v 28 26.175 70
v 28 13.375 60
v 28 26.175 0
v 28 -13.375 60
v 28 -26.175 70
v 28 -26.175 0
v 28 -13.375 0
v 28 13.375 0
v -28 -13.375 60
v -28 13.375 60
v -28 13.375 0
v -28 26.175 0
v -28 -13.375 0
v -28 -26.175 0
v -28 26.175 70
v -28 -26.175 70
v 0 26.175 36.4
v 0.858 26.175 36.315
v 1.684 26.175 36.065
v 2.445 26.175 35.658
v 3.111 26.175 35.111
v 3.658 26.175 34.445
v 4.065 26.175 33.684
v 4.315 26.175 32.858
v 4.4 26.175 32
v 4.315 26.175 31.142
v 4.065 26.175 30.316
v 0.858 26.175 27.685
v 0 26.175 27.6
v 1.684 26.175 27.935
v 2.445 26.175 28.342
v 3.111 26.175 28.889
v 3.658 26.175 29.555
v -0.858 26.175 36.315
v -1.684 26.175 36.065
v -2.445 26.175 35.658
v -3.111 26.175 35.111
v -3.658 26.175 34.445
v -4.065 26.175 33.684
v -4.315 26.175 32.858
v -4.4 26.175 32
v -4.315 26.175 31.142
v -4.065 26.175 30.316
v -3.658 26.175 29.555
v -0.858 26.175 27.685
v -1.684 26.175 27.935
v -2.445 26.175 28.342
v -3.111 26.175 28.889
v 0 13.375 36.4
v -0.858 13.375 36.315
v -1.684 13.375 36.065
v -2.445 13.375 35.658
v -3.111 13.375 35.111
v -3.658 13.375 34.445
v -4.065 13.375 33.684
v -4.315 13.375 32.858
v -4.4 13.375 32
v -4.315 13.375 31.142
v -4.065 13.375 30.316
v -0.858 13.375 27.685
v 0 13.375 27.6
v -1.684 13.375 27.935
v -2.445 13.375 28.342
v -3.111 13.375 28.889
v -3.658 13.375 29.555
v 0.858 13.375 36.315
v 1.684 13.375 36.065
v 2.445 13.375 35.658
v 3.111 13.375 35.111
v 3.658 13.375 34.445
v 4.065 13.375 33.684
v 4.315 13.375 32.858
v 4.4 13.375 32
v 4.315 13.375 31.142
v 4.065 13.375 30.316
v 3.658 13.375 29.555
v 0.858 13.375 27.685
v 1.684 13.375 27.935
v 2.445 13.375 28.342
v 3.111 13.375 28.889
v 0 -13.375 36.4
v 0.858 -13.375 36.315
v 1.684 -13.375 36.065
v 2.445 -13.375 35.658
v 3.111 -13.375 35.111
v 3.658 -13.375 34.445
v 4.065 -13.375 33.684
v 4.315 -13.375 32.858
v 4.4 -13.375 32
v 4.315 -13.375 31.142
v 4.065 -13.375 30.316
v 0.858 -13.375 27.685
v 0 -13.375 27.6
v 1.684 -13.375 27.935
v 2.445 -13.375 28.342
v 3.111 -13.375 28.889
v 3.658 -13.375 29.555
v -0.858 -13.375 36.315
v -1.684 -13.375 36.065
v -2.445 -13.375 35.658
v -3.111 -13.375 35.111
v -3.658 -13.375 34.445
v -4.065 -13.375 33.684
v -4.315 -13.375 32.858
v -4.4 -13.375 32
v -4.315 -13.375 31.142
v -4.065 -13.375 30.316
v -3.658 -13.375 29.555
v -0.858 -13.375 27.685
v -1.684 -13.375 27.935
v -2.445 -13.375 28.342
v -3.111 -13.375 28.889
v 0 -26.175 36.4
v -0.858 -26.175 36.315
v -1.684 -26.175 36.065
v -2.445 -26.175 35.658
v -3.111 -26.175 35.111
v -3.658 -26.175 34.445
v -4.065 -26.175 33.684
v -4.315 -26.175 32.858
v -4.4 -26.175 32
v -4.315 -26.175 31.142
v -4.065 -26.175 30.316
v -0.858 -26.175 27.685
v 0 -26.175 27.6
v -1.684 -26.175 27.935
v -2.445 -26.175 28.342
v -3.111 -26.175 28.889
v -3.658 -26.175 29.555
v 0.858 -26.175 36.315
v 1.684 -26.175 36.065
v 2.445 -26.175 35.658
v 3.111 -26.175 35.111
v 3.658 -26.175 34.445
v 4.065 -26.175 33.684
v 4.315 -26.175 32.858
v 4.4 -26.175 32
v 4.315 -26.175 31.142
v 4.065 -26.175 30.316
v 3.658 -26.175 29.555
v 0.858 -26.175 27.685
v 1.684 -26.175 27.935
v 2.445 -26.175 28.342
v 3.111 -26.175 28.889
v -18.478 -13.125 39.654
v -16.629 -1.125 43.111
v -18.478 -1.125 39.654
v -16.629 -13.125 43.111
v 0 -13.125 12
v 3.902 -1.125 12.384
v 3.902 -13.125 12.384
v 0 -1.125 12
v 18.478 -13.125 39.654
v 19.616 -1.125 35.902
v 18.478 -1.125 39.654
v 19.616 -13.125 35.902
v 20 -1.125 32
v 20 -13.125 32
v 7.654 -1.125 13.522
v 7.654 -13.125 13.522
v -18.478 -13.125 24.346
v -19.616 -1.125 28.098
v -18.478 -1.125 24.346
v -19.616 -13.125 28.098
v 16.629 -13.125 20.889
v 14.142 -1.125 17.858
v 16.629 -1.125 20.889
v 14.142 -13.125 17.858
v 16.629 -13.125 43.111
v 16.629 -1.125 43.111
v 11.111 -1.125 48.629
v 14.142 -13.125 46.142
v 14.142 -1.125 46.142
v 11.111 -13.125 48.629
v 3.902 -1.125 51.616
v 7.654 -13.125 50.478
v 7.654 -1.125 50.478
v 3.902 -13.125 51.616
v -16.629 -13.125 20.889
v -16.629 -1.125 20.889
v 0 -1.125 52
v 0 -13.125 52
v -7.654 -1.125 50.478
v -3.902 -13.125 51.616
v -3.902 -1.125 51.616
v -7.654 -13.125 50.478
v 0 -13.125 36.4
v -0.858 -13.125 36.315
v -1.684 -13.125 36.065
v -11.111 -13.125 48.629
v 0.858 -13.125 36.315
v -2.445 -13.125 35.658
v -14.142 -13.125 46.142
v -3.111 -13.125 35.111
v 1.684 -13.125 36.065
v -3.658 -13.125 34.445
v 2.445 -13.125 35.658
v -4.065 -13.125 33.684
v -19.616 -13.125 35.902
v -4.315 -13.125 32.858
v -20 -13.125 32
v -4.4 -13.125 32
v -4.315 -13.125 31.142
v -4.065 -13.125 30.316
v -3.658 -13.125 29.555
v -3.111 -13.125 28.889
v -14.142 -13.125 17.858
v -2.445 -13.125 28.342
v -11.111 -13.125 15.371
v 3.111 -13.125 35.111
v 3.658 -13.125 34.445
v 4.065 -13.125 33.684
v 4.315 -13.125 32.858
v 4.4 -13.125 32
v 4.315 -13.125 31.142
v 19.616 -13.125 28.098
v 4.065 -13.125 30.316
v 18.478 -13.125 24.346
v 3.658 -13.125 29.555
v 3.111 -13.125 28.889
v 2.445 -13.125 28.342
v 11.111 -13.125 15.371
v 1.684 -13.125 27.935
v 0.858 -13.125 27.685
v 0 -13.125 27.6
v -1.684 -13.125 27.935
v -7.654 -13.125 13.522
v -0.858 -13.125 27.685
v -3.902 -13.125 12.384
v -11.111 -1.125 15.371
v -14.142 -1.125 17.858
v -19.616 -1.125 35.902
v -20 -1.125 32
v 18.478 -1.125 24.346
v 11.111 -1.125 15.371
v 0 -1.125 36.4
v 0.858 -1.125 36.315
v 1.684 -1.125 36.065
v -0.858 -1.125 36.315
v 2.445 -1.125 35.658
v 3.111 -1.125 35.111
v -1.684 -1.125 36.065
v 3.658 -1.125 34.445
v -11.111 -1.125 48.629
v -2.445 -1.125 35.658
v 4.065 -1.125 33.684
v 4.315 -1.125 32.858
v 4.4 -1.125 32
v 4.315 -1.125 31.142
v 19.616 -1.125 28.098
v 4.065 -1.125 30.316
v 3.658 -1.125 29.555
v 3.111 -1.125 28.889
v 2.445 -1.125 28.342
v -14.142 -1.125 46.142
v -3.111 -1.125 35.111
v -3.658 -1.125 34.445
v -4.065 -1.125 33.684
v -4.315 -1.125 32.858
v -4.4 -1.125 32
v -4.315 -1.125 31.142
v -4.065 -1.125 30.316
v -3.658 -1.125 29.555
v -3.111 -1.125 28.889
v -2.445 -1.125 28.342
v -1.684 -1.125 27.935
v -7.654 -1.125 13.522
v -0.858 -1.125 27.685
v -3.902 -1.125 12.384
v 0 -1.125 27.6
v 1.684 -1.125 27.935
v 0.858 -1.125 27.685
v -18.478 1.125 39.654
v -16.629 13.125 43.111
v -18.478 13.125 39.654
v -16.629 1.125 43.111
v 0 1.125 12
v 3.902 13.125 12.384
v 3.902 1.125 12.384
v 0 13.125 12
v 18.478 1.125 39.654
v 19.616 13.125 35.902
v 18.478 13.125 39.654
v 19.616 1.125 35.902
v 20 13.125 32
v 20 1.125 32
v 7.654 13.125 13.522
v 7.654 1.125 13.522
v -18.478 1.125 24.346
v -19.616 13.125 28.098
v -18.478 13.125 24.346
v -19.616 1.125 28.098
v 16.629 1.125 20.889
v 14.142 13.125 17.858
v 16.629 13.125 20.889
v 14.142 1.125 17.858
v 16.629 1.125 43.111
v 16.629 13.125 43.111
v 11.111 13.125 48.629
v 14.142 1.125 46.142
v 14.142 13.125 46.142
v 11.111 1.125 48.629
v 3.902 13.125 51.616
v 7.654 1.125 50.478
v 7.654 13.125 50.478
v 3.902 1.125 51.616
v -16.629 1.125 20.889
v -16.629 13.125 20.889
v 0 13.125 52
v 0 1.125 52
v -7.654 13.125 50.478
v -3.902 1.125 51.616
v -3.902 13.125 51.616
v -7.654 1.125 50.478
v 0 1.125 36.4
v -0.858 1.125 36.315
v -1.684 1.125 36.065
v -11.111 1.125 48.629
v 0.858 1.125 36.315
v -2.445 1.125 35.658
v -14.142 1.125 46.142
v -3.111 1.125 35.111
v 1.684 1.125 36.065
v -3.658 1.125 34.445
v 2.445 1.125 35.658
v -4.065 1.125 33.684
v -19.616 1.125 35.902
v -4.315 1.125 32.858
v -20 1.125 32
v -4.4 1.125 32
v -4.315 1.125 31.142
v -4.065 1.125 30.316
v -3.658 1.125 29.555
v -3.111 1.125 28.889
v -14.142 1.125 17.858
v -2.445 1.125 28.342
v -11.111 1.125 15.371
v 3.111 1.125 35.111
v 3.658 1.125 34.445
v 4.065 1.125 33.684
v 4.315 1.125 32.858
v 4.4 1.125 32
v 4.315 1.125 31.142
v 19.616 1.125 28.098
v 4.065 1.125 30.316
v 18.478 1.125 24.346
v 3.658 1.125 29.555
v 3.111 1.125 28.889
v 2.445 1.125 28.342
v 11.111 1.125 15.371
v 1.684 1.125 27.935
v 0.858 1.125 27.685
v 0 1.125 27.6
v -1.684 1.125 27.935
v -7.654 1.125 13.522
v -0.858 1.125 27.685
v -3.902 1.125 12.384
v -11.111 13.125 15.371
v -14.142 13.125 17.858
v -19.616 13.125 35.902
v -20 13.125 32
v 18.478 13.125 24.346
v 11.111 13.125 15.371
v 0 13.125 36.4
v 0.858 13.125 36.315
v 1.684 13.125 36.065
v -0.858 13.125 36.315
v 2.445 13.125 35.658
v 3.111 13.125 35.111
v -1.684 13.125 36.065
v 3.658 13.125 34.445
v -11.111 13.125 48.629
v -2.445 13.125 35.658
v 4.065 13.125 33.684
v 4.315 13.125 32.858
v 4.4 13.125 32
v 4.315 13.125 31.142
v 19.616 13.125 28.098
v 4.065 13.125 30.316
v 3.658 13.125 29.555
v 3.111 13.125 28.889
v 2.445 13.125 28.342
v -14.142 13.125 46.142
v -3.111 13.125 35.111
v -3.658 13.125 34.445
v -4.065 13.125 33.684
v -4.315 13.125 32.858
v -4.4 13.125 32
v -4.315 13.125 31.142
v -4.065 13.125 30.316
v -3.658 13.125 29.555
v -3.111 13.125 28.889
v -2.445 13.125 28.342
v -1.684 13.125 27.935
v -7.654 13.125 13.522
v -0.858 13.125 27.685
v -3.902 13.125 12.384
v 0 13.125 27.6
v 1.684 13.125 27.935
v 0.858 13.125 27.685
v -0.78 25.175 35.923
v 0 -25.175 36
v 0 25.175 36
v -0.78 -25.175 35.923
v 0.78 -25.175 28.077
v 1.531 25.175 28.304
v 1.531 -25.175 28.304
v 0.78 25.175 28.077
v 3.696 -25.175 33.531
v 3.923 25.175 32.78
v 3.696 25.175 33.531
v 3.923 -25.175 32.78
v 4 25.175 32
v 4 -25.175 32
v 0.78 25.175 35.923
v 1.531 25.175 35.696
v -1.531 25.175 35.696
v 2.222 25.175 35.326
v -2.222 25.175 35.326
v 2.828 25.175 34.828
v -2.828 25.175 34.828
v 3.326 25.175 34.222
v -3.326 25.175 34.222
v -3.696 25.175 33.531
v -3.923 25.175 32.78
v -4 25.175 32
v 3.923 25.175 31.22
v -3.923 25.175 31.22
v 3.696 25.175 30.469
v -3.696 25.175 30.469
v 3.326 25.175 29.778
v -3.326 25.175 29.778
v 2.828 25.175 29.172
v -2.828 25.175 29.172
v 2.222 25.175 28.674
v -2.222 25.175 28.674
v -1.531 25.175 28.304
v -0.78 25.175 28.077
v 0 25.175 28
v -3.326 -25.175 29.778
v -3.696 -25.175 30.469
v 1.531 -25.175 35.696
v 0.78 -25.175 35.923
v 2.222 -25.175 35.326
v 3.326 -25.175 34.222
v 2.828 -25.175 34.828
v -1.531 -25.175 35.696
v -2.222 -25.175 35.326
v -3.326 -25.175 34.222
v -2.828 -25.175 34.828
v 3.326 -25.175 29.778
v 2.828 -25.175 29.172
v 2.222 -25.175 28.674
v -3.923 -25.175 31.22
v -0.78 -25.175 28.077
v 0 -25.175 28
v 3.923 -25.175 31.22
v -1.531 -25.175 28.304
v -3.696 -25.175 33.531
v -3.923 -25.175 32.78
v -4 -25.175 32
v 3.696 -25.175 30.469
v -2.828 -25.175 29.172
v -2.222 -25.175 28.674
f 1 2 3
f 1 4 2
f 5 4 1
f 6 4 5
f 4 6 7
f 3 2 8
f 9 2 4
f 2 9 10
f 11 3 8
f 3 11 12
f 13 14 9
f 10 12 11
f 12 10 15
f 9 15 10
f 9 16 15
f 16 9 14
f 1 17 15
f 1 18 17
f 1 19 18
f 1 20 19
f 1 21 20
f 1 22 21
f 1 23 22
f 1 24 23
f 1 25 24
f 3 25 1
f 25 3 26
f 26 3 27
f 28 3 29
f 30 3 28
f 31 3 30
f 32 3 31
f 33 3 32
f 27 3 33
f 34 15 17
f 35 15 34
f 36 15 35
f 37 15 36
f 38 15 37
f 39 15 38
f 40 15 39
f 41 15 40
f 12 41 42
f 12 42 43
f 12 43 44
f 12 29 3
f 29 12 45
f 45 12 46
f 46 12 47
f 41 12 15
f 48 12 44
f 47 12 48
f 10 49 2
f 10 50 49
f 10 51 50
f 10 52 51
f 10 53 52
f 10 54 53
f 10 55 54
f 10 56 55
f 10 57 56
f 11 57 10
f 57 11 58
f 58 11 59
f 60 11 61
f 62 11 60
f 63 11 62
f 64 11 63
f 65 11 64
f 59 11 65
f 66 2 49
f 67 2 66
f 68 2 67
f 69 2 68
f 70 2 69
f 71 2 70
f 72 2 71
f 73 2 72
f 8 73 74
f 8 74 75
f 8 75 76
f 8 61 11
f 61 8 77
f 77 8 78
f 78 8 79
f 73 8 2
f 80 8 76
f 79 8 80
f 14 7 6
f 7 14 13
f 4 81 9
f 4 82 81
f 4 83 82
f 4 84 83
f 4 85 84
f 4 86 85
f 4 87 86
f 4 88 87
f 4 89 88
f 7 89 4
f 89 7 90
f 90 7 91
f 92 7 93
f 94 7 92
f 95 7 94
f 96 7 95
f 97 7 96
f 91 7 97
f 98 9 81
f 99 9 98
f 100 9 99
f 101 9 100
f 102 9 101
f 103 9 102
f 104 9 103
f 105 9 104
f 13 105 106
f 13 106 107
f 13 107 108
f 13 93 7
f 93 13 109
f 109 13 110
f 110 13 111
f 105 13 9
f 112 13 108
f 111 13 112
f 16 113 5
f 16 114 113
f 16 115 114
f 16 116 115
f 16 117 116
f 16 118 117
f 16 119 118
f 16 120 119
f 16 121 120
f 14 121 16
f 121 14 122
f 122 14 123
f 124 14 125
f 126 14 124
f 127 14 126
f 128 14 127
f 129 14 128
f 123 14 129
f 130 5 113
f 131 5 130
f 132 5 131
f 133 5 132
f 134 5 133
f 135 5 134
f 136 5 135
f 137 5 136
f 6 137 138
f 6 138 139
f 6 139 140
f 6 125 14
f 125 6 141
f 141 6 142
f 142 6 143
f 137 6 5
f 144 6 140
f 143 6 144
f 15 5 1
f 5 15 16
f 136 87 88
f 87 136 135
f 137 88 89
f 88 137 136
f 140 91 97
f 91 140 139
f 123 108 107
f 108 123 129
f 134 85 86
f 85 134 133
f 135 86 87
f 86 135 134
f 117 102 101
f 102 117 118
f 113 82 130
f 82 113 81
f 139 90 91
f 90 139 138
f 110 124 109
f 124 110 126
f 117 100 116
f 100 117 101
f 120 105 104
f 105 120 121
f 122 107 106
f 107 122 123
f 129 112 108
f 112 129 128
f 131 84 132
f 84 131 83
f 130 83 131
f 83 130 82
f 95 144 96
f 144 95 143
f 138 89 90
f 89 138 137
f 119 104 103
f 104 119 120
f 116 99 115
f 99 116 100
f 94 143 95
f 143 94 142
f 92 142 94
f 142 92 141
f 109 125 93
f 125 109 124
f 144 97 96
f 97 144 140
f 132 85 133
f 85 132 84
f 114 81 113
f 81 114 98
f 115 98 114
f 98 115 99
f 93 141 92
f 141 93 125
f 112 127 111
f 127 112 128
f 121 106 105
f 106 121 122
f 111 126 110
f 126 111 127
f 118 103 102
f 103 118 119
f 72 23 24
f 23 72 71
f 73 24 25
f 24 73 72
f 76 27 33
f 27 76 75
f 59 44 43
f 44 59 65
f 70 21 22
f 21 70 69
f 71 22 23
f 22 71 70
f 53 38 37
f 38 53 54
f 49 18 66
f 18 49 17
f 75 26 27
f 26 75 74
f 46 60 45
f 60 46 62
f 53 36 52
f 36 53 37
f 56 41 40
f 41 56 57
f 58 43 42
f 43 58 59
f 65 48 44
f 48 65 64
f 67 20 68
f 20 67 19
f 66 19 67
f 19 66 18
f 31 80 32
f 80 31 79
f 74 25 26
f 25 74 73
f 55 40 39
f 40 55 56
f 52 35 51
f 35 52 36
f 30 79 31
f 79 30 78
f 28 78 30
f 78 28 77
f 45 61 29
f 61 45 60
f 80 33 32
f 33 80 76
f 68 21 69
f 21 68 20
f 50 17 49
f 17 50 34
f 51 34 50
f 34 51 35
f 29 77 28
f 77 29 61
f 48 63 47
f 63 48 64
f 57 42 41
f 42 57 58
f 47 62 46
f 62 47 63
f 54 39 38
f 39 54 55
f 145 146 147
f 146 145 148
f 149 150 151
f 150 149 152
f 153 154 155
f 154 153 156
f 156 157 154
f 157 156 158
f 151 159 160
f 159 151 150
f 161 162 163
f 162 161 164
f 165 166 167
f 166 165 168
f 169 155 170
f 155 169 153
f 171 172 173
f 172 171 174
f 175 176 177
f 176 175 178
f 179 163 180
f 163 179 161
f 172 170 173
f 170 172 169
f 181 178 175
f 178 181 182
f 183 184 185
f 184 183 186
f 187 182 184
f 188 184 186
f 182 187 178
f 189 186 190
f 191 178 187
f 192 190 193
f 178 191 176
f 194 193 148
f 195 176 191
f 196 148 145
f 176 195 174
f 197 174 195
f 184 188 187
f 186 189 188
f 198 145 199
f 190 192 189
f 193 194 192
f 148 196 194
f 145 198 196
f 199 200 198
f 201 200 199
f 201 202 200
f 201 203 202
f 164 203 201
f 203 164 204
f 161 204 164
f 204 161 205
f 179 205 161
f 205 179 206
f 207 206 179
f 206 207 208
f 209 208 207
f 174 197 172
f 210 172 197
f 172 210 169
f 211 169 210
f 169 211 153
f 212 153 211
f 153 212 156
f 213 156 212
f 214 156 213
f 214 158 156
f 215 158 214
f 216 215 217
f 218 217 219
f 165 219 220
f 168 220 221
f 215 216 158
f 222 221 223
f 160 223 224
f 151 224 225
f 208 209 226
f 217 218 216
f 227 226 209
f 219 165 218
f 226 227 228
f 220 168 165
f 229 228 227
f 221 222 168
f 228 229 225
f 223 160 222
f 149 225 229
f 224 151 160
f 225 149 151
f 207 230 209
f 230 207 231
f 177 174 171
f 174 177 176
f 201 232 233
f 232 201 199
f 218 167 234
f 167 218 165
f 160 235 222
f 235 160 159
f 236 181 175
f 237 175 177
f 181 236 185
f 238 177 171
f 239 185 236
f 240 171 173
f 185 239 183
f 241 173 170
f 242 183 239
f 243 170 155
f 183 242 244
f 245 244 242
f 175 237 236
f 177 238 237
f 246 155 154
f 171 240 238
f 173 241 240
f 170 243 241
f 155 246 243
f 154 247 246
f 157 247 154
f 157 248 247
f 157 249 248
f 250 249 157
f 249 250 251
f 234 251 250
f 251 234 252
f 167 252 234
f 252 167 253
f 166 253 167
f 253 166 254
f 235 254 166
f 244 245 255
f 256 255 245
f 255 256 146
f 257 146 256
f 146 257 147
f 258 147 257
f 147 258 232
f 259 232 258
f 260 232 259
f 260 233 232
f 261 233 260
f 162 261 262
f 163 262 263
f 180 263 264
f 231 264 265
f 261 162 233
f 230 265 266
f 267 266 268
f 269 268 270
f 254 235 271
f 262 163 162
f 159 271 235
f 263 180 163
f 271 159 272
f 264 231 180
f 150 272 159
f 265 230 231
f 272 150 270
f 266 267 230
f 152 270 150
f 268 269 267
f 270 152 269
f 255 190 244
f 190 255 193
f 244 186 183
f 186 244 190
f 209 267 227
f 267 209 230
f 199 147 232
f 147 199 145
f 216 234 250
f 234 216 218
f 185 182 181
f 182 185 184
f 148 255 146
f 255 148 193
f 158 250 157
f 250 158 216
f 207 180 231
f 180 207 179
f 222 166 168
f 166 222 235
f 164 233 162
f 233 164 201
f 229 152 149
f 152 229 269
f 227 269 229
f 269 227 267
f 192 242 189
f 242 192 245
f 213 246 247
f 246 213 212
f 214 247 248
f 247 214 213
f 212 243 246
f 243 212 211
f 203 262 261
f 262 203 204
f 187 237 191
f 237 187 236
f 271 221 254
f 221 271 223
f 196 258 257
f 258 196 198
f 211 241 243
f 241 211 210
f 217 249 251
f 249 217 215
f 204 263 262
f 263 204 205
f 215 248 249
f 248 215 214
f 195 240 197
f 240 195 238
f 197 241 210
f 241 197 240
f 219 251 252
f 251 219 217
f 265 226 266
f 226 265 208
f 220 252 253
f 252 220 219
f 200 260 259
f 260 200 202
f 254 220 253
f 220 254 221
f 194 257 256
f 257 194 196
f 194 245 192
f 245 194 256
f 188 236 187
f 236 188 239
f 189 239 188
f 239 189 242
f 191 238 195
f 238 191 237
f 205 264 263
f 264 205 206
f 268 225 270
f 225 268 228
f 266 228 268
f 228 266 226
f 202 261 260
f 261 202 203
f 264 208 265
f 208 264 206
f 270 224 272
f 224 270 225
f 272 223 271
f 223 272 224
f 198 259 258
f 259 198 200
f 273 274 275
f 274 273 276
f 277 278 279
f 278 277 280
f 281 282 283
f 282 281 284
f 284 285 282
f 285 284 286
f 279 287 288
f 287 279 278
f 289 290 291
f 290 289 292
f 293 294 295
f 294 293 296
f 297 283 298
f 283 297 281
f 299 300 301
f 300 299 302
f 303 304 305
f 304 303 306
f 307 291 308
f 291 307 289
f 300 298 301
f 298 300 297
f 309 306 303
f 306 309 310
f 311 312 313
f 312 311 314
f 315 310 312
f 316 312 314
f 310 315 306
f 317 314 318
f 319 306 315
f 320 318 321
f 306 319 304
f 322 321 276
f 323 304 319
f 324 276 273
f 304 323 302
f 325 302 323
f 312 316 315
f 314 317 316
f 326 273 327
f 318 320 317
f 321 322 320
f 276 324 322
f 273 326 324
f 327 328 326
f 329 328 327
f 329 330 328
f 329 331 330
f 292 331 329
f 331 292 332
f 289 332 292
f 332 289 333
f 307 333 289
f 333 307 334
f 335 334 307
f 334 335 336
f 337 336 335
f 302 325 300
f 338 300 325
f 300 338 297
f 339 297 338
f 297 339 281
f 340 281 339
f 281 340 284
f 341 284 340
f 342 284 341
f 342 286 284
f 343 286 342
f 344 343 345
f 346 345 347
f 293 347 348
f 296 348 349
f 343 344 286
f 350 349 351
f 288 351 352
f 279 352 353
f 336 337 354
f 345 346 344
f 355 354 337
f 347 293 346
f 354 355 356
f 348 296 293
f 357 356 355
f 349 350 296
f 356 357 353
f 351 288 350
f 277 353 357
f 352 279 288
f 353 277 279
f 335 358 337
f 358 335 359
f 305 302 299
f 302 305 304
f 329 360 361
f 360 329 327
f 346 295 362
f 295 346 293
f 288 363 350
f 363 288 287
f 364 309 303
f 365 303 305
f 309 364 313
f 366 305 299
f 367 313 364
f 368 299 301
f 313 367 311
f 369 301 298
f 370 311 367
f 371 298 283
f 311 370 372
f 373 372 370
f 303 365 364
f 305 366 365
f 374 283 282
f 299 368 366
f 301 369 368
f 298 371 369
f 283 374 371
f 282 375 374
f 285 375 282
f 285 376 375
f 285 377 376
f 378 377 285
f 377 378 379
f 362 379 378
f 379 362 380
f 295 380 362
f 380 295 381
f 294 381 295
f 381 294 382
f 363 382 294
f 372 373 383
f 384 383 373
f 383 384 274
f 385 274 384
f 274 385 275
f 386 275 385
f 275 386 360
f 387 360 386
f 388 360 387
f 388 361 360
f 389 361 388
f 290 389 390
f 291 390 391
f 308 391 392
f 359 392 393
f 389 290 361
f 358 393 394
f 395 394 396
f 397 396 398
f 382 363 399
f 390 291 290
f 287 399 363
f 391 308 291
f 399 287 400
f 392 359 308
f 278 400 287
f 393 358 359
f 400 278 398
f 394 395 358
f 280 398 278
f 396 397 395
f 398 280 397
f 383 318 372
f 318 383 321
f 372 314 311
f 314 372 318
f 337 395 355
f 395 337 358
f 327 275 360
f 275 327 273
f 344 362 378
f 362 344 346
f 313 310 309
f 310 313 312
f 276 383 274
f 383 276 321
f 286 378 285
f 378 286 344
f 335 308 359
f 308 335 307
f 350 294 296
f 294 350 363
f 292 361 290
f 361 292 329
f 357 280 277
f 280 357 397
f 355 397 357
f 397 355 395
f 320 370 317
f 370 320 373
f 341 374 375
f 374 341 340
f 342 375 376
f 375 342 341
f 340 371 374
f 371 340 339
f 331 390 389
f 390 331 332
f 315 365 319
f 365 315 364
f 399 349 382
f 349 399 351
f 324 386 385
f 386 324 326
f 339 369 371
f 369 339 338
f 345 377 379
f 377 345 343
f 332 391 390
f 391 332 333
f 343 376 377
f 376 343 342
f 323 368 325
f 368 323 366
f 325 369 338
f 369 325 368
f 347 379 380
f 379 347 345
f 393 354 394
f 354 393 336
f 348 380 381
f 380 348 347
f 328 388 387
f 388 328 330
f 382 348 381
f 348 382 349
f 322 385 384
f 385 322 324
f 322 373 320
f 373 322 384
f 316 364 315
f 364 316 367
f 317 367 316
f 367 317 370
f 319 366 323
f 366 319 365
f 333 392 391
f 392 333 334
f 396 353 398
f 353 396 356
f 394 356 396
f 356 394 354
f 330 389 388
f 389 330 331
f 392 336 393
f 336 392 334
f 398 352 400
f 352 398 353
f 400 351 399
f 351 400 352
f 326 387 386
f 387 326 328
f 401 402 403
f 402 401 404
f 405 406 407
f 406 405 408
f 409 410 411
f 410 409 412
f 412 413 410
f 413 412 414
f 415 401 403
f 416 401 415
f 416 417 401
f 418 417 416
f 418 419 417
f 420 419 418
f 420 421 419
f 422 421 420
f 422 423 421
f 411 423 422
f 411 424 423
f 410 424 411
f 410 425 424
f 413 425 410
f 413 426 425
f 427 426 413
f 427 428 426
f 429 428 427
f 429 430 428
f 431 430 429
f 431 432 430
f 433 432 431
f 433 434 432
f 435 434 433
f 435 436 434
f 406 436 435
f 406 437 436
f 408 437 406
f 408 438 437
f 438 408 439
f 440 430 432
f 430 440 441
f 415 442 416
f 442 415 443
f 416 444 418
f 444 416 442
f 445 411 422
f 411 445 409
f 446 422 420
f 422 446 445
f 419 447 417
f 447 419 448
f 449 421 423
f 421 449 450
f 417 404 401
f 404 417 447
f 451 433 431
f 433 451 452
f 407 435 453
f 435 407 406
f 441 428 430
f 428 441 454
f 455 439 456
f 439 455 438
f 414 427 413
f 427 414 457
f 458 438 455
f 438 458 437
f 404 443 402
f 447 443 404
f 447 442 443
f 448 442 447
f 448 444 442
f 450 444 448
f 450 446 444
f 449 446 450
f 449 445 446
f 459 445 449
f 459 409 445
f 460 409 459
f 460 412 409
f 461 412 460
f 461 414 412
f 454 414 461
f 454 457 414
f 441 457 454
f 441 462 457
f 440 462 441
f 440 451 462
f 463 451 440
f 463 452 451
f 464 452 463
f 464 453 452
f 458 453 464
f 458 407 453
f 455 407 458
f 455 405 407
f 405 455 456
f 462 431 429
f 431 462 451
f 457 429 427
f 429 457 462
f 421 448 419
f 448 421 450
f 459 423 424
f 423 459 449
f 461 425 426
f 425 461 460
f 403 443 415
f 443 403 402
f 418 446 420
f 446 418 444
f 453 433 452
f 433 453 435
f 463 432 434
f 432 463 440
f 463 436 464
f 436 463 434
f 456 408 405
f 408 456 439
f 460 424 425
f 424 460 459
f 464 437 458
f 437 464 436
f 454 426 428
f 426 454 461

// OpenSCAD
$fn = 32;

// ------------------------------------------------------------------------
// Trolley wheel set: wheels d40, fork 60 mm tall
// Every part is its own module, assembly() places every instance.
// ------------------------------------------------------------------------

// --- part 1 ---
module trolley_fork() {
  difference() {
    union() {
      translate([-28, 13.375, 0]) cube([56, 12.8, 60]);
      translate([-28, -26.175, 0]) cube([56, 12.8, 60]);
      translate([-28, -26.175, 60]) cube([56, 52.35, 10]);
    }
    translate([0, -19.775, 32]) rotate([90, 0, 0]) cylinder(h = 14.8, d = 8.8, center = true);
    translate([0, 19.775, 32]) rotate([90, 0, 0]) cylinder(h = 14.8, d = 8.8, center = true);
  }
}

// --- part 2 ---
module trolley_wheel() {
  difference() {
      translate([0, 0, 0]) cylinder(h = 12, d = 40);
      translate([0, 0, -1]) cylinder(h = 14, d = 8.8);
    }
}

// --- part 3 ---
module trolley_axle() {
  translate([0, 0, -25.175]) cylinder(h = 50.35, d = 8);
}

// --- assembly ---
module assembly() {
  color([0.80, 0.24, 0.20]) translate([0, 0, 0]) rotate([0, 0, 0]) trolley_fork();
  color([0.20, 0.45, 0.75]) translate([0, -1.125, 32]) rotate([90, 0, 0]) trolley_wheel();
  color([0.25, 0.62, 0.32]) translate([0, 13.125, 32]) rotate([90, 0, 0]) trolley_wheel();
  color([0.92, 0.70, 0.18]) translate([0, 0, 32]) rotate([90, 0, 0]) trolley_axle();
}

assembly();
